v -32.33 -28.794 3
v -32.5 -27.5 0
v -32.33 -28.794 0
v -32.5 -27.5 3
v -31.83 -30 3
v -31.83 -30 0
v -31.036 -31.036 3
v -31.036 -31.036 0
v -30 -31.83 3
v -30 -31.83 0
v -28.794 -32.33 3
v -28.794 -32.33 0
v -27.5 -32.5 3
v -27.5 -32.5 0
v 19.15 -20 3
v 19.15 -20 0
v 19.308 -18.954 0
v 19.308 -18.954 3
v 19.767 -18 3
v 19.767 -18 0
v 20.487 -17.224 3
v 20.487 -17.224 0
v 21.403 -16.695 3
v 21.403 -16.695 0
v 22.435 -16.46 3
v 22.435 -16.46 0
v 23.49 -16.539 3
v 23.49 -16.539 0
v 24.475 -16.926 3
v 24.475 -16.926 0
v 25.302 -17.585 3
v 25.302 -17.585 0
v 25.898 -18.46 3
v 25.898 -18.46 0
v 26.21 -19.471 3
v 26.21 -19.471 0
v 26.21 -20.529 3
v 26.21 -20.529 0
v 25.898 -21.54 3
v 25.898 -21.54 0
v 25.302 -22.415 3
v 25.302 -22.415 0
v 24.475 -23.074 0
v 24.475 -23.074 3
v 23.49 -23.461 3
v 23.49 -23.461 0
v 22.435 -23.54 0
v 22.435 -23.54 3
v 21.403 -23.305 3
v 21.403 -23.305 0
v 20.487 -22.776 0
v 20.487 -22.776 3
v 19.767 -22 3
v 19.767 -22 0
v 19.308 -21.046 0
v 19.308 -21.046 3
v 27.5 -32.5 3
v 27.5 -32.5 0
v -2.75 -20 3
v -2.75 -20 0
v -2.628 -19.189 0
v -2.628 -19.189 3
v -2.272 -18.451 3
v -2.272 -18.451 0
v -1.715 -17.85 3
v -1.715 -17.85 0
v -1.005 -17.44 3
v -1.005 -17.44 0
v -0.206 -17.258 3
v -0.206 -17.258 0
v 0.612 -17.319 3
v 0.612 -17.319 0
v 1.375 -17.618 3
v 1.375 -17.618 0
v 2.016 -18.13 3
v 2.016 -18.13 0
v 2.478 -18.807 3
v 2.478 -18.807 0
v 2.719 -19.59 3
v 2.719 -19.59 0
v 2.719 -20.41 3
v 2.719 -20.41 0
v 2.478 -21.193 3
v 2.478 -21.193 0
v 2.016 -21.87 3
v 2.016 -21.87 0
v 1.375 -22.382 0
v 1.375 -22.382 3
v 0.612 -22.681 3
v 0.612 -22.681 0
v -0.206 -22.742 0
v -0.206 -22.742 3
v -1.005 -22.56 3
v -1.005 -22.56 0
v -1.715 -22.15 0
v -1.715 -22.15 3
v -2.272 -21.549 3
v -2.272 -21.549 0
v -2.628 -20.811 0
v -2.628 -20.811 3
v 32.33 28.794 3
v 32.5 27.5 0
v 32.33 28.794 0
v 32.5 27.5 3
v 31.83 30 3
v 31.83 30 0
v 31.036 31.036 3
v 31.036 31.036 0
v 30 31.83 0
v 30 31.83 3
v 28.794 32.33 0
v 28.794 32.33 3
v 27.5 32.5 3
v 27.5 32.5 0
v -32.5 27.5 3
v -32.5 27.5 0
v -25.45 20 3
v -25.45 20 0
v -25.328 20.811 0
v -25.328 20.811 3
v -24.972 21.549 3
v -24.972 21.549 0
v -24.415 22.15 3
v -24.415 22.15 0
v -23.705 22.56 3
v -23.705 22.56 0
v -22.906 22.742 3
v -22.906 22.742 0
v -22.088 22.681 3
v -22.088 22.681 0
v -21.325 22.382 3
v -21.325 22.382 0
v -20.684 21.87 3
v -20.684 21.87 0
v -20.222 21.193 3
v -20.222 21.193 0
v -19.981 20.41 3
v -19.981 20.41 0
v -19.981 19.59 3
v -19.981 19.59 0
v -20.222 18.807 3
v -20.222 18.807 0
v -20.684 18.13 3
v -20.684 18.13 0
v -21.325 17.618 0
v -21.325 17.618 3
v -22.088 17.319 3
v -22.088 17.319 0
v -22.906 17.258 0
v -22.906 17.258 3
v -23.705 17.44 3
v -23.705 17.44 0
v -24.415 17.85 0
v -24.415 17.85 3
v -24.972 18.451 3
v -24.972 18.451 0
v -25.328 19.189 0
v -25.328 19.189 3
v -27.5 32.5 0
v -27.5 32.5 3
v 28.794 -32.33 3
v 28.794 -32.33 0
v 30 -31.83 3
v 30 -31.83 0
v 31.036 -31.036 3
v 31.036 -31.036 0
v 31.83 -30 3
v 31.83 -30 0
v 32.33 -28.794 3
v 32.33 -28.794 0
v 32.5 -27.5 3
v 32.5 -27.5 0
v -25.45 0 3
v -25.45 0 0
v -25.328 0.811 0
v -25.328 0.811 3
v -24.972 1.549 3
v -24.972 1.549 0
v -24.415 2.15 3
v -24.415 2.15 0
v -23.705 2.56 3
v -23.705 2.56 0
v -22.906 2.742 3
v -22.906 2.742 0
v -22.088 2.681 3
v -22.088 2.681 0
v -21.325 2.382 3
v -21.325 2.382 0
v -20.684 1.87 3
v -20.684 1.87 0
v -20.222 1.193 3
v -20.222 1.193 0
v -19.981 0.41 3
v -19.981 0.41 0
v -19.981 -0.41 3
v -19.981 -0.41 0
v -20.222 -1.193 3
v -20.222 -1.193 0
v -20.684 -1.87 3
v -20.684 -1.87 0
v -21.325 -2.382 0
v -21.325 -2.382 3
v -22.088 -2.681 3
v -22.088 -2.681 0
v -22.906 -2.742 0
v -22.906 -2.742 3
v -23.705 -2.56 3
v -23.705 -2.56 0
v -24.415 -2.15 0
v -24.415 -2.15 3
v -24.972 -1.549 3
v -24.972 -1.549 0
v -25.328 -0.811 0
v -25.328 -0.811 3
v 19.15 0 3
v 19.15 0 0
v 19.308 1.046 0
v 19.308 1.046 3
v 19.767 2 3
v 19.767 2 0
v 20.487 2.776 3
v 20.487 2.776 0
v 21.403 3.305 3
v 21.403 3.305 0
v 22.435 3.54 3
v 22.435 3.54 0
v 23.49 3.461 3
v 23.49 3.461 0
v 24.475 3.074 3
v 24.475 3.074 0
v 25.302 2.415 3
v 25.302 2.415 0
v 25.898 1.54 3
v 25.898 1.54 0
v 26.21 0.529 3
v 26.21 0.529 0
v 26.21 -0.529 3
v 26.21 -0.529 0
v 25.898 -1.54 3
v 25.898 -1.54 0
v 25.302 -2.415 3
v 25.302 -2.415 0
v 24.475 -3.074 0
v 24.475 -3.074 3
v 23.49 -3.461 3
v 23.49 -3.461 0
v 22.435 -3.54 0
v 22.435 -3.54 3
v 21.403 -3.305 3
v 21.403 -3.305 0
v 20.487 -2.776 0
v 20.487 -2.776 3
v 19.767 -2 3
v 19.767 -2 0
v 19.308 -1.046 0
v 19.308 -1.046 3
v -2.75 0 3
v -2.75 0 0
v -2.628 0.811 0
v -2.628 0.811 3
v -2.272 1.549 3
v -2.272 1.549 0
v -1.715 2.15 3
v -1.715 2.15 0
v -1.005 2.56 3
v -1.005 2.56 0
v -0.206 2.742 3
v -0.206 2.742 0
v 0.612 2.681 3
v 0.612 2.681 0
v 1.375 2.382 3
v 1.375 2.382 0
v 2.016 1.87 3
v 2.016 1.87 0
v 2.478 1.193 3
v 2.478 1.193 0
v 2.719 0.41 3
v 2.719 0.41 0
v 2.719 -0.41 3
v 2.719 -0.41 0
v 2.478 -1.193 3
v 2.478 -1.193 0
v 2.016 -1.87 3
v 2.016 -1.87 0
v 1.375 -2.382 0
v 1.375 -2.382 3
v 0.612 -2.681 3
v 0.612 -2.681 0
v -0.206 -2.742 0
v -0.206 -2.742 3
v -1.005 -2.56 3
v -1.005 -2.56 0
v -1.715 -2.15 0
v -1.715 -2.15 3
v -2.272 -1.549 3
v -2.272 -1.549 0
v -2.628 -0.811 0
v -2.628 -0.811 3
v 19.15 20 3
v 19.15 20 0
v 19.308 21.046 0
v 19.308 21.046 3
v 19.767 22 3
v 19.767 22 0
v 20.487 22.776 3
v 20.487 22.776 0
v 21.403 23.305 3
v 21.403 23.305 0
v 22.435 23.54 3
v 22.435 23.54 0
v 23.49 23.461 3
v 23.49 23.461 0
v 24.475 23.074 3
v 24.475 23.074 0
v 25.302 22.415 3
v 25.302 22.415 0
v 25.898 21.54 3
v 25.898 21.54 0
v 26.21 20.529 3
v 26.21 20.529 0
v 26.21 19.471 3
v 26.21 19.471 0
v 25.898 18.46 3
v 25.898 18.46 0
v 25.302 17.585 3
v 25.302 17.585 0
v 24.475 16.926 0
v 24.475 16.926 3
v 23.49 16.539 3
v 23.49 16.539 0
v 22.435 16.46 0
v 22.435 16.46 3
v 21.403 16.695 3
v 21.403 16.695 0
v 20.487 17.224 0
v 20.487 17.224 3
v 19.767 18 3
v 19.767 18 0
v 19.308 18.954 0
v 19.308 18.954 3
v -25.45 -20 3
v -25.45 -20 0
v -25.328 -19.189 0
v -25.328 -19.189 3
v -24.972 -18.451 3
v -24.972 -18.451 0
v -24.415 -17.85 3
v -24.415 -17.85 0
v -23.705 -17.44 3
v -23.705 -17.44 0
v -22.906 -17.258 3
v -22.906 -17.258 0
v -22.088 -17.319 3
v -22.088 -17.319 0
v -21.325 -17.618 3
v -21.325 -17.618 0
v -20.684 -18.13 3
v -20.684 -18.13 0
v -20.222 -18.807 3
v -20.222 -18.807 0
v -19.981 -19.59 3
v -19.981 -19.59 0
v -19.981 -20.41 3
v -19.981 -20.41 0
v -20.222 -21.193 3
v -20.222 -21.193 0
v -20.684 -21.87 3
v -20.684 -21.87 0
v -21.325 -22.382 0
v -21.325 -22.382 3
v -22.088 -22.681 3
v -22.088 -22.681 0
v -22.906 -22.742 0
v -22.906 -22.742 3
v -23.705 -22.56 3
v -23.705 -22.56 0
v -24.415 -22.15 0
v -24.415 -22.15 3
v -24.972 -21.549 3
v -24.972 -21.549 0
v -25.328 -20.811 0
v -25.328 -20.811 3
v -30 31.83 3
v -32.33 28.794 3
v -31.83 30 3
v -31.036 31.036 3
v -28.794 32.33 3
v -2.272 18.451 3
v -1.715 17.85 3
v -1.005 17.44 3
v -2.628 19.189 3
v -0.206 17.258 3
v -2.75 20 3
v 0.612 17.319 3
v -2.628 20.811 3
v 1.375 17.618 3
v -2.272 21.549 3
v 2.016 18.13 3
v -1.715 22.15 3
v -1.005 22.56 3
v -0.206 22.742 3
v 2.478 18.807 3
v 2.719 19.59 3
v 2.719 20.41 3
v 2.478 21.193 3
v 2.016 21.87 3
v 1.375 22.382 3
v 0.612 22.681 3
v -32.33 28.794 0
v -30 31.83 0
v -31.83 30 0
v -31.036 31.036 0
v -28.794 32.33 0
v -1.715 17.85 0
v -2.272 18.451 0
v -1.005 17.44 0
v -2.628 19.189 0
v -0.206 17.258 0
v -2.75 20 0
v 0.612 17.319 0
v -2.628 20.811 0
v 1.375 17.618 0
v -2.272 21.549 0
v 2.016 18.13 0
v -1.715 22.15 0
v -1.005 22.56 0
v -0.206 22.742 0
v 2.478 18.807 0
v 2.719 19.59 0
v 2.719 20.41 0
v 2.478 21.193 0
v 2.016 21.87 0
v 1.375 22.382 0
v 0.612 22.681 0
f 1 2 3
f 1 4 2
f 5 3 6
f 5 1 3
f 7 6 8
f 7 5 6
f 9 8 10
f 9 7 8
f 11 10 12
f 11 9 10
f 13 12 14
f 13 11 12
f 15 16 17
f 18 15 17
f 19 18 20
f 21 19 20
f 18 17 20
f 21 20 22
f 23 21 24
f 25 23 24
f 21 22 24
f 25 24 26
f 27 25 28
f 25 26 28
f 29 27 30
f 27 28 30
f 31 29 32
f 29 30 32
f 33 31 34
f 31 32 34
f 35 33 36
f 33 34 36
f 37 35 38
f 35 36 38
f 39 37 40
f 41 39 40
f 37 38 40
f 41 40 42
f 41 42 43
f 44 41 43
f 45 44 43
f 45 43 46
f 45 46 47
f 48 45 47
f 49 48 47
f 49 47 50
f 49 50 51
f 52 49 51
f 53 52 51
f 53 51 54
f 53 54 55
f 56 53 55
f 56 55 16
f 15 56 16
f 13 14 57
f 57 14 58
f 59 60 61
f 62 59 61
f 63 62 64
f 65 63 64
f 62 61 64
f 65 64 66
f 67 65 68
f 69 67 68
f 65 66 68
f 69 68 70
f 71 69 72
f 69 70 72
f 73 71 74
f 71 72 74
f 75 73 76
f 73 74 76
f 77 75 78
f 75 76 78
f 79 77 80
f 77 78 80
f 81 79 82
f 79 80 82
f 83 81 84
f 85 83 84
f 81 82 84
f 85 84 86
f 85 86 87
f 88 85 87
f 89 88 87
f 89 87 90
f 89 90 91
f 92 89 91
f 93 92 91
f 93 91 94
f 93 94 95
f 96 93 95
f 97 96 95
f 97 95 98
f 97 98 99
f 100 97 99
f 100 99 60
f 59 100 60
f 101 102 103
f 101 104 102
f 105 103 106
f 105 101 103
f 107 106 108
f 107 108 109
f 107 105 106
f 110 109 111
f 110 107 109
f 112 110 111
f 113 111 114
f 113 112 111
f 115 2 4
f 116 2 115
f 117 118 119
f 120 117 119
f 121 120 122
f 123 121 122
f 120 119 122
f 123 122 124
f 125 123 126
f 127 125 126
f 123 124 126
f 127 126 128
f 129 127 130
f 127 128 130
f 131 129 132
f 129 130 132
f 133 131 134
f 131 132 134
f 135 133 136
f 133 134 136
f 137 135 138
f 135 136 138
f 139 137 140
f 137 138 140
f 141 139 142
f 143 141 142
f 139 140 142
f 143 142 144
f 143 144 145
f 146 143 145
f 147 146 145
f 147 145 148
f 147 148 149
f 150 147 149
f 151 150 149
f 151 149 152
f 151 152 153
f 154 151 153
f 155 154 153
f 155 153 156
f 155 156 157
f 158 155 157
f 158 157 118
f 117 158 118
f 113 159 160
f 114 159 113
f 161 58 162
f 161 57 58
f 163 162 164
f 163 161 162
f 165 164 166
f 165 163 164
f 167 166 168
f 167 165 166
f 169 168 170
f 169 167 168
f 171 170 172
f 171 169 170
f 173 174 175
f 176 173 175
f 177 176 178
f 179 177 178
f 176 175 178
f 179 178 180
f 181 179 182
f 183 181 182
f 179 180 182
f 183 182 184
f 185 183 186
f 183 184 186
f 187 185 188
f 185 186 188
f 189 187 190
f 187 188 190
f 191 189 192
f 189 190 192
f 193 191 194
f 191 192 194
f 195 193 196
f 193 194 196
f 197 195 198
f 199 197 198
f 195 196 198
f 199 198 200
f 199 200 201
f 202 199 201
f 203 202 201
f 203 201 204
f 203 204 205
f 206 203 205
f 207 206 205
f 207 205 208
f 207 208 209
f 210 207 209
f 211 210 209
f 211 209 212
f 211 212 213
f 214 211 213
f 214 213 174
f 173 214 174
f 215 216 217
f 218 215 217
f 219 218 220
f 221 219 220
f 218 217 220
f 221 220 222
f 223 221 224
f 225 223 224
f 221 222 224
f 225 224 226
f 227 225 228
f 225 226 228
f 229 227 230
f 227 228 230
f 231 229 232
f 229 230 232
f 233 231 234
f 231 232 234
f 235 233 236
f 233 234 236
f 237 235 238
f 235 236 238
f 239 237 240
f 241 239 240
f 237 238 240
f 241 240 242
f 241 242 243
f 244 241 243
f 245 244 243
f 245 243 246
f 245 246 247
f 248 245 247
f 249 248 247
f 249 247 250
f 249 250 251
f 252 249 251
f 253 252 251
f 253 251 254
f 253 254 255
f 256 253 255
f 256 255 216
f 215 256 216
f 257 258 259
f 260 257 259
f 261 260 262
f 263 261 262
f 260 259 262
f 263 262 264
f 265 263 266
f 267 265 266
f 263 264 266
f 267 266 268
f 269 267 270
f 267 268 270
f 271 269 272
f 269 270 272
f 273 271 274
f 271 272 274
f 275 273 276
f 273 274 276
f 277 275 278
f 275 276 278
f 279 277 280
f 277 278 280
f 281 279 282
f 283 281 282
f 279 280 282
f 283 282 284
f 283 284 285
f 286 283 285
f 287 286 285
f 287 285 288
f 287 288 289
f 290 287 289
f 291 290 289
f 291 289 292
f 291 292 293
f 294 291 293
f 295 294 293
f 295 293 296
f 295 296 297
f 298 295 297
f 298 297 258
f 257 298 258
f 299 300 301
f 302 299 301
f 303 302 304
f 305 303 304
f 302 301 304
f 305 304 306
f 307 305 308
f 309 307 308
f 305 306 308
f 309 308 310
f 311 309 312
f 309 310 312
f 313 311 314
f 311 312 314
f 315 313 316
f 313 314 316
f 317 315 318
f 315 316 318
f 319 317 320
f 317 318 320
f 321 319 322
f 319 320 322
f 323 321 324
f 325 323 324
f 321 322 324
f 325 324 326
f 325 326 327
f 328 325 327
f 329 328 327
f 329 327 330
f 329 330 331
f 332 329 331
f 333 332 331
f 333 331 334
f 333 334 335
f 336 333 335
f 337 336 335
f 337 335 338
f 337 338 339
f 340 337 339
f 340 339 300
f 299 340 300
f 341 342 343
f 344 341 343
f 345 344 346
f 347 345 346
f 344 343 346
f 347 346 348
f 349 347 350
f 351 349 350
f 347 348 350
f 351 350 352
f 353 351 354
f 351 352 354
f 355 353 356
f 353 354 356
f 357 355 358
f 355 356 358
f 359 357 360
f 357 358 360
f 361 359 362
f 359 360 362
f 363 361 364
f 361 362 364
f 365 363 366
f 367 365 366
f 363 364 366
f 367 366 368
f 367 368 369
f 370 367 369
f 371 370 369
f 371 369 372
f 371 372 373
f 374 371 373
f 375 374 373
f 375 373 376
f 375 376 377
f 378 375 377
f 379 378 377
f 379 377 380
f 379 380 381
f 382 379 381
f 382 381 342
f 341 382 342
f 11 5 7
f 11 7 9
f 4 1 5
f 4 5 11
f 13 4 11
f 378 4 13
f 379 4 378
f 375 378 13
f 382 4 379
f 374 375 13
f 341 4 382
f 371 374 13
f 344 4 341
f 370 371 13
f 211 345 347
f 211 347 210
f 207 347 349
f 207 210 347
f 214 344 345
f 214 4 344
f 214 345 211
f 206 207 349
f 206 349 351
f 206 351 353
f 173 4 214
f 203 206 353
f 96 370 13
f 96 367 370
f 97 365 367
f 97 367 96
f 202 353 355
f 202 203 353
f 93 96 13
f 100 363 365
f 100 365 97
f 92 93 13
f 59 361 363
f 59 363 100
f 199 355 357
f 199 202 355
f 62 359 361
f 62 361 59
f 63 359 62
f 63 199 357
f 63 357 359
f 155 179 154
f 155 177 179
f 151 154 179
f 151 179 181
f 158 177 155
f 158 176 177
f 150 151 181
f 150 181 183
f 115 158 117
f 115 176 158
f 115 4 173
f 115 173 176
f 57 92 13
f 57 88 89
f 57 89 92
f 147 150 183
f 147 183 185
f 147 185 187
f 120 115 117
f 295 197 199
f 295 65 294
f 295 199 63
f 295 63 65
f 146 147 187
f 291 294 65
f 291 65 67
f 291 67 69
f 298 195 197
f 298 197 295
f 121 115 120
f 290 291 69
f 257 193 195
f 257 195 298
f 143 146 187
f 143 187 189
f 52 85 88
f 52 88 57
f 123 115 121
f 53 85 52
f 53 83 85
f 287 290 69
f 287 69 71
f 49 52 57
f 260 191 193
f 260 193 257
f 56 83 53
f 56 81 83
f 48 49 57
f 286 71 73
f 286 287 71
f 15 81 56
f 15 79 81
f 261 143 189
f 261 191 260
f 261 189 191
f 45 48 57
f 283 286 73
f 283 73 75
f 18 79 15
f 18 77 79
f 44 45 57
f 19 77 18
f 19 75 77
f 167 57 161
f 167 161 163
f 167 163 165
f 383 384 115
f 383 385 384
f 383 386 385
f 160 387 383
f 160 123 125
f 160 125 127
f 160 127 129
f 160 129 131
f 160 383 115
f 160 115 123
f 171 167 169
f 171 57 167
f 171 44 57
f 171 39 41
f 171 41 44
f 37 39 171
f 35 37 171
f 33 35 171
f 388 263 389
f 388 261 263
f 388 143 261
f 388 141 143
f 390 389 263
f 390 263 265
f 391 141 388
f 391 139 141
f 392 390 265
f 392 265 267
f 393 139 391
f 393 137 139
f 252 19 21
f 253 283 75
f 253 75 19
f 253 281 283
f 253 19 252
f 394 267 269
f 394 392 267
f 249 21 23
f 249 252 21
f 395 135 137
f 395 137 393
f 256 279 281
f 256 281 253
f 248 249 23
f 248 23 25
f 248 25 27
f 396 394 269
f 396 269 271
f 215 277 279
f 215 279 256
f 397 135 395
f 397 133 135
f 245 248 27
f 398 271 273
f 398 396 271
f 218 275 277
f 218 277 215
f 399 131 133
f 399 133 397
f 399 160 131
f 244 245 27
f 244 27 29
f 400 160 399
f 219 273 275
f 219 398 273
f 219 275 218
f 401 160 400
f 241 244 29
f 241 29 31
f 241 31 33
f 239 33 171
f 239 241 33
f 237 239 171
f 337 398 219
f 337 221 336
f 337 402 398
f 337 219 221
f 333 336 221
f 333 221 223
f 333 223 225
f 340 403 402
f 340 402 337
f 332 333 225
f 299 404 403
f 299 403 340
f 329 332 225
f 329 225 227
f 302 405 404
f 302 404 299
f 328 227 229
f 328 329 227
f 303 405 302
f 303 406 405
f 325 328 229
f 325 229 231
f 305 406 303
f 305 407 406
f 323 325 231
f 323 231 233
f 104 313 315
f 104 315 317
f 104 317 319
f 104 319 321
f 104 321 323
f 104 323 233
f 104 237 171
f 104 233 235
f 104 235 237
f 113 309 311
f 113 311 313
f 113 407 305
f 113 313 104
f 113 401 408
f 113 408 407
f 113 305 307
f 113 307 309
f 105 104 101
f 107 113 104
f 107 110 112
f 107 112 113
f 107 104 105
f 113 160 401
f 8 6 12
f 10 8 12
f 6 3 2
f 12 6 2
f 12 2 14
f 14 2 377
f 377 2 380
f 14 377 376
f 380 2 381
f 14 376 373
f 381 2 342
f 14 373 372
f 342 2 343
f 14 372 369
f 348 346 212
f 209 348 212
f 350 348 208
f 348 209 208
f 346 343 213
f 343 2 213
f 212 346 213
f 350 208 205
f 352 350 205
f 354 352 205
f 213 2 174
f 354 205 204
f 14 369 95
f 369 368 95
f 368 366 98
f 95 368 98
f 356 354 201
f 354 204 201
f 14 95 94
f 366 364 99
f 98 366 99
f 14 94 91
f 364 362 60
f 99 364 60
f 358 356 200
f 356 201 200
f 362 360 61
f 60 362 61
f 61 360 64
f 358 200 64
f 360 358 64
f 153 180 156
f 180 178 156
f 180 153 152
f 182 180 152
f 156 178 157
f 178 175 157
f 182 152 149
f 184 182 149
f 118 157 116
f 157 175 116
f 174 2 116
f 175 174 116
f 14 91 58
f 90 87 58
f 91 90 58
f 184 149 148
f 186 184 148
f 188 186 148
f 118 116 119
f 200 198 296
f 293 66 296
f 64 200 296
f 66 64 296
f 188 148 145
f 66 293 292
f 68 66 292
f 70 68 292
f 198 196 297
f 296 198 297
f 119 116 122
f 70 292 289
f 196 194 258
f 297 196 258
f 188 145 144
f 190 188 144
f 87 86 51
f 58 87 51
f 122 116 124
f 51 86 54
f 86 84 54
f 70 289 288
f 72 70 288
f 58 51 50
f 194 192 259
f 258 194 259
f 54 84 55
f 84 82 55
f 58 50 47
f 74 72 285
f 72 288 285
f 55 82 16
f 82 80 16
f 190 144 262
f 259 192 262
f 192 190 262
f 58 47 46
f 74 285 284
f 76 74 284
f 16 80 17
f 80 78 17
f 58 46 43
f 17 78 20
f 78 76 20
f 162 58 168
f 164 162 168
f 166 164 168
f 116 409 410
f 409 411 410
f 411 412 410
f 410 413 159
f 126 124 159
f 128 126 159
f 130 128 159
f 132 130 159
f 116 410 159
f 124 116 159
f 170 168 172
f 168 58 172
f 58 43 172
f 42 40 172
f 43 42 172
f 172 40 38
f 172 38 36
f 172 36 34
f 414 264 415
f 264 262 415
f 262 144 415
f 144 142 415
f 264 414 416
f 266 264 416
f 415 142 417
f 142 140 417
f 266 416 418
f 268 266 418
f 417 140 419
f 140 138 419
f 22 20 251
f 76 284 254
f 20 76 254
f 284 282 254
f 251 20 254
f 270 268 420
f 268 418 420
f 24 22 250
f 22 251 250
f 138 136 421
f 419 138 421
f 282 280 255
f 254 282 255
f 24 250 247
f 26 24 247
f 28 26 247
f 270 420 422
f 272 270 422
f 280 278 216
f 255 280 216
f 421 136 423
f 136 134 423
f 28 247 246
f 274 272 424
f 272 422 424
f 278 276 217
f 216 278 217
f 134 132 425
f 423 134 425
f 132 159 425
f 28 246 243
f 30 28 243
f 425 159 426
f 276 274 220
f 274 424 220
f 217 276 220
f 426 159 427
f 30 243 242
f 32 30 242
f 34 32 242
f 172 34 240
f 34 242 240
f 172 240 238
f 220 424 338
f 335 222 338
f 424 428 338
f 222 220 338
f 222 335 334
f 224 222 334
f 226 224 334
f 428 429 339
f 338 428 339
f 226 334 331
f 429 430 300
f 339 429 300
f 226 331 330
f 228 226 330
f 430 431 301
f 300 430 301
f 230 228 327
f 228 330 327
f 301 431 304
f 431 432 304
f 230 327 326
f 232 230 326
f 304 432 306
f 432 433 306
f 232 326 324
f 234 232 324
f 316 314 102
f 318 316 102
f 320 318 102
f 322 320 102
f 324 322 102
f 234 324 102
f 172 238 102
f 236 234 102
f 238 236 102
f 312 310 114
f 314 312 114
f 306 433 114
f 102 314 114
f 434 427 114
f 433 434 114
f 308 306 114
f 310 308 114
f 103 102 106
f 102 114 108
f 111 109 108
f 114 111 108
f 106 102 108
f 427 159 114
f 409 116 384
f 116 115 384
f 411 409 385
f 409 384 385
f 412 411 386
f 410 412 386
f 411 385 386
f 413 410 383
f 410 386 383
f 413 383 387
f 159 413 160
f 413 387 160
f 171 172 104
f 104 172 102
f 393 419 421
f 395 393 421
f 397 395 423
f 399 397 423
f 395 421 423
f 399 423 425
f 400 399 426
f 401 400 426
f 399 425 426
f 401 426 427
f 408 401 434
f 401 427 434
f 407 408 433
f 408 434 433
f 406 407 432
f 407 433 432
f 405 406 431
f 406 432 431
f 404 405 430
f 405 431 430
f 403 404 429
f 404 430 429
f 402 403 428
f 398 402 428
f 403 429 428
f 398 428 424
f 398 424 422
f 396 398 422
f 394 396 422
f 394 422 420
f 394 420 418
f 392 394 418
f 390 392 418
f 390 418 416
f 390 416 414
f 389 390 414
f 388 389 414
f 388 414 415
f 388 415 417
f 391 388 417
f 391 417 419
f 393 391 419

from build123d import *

# Parameters (mm, degrees)
F0_W     = 65
F0_H     = 65
F1_DEPTH = 3
F2_R     = 5
F4_D     = 5.5
F6_D     = 7.1


with BuildPart() as f1:
    # F0 (on Top) → F1 (new body)
    with BuildSketch(Plane.XY):
        Rectangle(F0_W, F0_H)
    extrude(amount=F1_DEPTH)

    # F2
    f2_edges = [f1.edges().sort_by_distance(p)[0] for p in [
        (-32.5, 32.5, 1.5),
        (32.5, 32.5, 1.5),
        (32.5, -32.5, 1.5),
        (-32.5, -32.5, 1.5),
    ]]
    fillet(f2_edges, radius=F2_R)

    # F4 (through all)
    with Locations(Plane.XY.offset(3)):
        with Locations((-22.7, 20), (-22.7, -20), (0, -20), (0, 20), (-22.7, 0), (0, 0)):
            Hole(F4_D / 2)

    # F6 (through all)
    with Locations(Plane.XY.offset(3)):
        with Locations((22.7, 20), (22.7, -20), (22.7, 0)):
            Hole(F6_D / 2)


solid = f1.part
